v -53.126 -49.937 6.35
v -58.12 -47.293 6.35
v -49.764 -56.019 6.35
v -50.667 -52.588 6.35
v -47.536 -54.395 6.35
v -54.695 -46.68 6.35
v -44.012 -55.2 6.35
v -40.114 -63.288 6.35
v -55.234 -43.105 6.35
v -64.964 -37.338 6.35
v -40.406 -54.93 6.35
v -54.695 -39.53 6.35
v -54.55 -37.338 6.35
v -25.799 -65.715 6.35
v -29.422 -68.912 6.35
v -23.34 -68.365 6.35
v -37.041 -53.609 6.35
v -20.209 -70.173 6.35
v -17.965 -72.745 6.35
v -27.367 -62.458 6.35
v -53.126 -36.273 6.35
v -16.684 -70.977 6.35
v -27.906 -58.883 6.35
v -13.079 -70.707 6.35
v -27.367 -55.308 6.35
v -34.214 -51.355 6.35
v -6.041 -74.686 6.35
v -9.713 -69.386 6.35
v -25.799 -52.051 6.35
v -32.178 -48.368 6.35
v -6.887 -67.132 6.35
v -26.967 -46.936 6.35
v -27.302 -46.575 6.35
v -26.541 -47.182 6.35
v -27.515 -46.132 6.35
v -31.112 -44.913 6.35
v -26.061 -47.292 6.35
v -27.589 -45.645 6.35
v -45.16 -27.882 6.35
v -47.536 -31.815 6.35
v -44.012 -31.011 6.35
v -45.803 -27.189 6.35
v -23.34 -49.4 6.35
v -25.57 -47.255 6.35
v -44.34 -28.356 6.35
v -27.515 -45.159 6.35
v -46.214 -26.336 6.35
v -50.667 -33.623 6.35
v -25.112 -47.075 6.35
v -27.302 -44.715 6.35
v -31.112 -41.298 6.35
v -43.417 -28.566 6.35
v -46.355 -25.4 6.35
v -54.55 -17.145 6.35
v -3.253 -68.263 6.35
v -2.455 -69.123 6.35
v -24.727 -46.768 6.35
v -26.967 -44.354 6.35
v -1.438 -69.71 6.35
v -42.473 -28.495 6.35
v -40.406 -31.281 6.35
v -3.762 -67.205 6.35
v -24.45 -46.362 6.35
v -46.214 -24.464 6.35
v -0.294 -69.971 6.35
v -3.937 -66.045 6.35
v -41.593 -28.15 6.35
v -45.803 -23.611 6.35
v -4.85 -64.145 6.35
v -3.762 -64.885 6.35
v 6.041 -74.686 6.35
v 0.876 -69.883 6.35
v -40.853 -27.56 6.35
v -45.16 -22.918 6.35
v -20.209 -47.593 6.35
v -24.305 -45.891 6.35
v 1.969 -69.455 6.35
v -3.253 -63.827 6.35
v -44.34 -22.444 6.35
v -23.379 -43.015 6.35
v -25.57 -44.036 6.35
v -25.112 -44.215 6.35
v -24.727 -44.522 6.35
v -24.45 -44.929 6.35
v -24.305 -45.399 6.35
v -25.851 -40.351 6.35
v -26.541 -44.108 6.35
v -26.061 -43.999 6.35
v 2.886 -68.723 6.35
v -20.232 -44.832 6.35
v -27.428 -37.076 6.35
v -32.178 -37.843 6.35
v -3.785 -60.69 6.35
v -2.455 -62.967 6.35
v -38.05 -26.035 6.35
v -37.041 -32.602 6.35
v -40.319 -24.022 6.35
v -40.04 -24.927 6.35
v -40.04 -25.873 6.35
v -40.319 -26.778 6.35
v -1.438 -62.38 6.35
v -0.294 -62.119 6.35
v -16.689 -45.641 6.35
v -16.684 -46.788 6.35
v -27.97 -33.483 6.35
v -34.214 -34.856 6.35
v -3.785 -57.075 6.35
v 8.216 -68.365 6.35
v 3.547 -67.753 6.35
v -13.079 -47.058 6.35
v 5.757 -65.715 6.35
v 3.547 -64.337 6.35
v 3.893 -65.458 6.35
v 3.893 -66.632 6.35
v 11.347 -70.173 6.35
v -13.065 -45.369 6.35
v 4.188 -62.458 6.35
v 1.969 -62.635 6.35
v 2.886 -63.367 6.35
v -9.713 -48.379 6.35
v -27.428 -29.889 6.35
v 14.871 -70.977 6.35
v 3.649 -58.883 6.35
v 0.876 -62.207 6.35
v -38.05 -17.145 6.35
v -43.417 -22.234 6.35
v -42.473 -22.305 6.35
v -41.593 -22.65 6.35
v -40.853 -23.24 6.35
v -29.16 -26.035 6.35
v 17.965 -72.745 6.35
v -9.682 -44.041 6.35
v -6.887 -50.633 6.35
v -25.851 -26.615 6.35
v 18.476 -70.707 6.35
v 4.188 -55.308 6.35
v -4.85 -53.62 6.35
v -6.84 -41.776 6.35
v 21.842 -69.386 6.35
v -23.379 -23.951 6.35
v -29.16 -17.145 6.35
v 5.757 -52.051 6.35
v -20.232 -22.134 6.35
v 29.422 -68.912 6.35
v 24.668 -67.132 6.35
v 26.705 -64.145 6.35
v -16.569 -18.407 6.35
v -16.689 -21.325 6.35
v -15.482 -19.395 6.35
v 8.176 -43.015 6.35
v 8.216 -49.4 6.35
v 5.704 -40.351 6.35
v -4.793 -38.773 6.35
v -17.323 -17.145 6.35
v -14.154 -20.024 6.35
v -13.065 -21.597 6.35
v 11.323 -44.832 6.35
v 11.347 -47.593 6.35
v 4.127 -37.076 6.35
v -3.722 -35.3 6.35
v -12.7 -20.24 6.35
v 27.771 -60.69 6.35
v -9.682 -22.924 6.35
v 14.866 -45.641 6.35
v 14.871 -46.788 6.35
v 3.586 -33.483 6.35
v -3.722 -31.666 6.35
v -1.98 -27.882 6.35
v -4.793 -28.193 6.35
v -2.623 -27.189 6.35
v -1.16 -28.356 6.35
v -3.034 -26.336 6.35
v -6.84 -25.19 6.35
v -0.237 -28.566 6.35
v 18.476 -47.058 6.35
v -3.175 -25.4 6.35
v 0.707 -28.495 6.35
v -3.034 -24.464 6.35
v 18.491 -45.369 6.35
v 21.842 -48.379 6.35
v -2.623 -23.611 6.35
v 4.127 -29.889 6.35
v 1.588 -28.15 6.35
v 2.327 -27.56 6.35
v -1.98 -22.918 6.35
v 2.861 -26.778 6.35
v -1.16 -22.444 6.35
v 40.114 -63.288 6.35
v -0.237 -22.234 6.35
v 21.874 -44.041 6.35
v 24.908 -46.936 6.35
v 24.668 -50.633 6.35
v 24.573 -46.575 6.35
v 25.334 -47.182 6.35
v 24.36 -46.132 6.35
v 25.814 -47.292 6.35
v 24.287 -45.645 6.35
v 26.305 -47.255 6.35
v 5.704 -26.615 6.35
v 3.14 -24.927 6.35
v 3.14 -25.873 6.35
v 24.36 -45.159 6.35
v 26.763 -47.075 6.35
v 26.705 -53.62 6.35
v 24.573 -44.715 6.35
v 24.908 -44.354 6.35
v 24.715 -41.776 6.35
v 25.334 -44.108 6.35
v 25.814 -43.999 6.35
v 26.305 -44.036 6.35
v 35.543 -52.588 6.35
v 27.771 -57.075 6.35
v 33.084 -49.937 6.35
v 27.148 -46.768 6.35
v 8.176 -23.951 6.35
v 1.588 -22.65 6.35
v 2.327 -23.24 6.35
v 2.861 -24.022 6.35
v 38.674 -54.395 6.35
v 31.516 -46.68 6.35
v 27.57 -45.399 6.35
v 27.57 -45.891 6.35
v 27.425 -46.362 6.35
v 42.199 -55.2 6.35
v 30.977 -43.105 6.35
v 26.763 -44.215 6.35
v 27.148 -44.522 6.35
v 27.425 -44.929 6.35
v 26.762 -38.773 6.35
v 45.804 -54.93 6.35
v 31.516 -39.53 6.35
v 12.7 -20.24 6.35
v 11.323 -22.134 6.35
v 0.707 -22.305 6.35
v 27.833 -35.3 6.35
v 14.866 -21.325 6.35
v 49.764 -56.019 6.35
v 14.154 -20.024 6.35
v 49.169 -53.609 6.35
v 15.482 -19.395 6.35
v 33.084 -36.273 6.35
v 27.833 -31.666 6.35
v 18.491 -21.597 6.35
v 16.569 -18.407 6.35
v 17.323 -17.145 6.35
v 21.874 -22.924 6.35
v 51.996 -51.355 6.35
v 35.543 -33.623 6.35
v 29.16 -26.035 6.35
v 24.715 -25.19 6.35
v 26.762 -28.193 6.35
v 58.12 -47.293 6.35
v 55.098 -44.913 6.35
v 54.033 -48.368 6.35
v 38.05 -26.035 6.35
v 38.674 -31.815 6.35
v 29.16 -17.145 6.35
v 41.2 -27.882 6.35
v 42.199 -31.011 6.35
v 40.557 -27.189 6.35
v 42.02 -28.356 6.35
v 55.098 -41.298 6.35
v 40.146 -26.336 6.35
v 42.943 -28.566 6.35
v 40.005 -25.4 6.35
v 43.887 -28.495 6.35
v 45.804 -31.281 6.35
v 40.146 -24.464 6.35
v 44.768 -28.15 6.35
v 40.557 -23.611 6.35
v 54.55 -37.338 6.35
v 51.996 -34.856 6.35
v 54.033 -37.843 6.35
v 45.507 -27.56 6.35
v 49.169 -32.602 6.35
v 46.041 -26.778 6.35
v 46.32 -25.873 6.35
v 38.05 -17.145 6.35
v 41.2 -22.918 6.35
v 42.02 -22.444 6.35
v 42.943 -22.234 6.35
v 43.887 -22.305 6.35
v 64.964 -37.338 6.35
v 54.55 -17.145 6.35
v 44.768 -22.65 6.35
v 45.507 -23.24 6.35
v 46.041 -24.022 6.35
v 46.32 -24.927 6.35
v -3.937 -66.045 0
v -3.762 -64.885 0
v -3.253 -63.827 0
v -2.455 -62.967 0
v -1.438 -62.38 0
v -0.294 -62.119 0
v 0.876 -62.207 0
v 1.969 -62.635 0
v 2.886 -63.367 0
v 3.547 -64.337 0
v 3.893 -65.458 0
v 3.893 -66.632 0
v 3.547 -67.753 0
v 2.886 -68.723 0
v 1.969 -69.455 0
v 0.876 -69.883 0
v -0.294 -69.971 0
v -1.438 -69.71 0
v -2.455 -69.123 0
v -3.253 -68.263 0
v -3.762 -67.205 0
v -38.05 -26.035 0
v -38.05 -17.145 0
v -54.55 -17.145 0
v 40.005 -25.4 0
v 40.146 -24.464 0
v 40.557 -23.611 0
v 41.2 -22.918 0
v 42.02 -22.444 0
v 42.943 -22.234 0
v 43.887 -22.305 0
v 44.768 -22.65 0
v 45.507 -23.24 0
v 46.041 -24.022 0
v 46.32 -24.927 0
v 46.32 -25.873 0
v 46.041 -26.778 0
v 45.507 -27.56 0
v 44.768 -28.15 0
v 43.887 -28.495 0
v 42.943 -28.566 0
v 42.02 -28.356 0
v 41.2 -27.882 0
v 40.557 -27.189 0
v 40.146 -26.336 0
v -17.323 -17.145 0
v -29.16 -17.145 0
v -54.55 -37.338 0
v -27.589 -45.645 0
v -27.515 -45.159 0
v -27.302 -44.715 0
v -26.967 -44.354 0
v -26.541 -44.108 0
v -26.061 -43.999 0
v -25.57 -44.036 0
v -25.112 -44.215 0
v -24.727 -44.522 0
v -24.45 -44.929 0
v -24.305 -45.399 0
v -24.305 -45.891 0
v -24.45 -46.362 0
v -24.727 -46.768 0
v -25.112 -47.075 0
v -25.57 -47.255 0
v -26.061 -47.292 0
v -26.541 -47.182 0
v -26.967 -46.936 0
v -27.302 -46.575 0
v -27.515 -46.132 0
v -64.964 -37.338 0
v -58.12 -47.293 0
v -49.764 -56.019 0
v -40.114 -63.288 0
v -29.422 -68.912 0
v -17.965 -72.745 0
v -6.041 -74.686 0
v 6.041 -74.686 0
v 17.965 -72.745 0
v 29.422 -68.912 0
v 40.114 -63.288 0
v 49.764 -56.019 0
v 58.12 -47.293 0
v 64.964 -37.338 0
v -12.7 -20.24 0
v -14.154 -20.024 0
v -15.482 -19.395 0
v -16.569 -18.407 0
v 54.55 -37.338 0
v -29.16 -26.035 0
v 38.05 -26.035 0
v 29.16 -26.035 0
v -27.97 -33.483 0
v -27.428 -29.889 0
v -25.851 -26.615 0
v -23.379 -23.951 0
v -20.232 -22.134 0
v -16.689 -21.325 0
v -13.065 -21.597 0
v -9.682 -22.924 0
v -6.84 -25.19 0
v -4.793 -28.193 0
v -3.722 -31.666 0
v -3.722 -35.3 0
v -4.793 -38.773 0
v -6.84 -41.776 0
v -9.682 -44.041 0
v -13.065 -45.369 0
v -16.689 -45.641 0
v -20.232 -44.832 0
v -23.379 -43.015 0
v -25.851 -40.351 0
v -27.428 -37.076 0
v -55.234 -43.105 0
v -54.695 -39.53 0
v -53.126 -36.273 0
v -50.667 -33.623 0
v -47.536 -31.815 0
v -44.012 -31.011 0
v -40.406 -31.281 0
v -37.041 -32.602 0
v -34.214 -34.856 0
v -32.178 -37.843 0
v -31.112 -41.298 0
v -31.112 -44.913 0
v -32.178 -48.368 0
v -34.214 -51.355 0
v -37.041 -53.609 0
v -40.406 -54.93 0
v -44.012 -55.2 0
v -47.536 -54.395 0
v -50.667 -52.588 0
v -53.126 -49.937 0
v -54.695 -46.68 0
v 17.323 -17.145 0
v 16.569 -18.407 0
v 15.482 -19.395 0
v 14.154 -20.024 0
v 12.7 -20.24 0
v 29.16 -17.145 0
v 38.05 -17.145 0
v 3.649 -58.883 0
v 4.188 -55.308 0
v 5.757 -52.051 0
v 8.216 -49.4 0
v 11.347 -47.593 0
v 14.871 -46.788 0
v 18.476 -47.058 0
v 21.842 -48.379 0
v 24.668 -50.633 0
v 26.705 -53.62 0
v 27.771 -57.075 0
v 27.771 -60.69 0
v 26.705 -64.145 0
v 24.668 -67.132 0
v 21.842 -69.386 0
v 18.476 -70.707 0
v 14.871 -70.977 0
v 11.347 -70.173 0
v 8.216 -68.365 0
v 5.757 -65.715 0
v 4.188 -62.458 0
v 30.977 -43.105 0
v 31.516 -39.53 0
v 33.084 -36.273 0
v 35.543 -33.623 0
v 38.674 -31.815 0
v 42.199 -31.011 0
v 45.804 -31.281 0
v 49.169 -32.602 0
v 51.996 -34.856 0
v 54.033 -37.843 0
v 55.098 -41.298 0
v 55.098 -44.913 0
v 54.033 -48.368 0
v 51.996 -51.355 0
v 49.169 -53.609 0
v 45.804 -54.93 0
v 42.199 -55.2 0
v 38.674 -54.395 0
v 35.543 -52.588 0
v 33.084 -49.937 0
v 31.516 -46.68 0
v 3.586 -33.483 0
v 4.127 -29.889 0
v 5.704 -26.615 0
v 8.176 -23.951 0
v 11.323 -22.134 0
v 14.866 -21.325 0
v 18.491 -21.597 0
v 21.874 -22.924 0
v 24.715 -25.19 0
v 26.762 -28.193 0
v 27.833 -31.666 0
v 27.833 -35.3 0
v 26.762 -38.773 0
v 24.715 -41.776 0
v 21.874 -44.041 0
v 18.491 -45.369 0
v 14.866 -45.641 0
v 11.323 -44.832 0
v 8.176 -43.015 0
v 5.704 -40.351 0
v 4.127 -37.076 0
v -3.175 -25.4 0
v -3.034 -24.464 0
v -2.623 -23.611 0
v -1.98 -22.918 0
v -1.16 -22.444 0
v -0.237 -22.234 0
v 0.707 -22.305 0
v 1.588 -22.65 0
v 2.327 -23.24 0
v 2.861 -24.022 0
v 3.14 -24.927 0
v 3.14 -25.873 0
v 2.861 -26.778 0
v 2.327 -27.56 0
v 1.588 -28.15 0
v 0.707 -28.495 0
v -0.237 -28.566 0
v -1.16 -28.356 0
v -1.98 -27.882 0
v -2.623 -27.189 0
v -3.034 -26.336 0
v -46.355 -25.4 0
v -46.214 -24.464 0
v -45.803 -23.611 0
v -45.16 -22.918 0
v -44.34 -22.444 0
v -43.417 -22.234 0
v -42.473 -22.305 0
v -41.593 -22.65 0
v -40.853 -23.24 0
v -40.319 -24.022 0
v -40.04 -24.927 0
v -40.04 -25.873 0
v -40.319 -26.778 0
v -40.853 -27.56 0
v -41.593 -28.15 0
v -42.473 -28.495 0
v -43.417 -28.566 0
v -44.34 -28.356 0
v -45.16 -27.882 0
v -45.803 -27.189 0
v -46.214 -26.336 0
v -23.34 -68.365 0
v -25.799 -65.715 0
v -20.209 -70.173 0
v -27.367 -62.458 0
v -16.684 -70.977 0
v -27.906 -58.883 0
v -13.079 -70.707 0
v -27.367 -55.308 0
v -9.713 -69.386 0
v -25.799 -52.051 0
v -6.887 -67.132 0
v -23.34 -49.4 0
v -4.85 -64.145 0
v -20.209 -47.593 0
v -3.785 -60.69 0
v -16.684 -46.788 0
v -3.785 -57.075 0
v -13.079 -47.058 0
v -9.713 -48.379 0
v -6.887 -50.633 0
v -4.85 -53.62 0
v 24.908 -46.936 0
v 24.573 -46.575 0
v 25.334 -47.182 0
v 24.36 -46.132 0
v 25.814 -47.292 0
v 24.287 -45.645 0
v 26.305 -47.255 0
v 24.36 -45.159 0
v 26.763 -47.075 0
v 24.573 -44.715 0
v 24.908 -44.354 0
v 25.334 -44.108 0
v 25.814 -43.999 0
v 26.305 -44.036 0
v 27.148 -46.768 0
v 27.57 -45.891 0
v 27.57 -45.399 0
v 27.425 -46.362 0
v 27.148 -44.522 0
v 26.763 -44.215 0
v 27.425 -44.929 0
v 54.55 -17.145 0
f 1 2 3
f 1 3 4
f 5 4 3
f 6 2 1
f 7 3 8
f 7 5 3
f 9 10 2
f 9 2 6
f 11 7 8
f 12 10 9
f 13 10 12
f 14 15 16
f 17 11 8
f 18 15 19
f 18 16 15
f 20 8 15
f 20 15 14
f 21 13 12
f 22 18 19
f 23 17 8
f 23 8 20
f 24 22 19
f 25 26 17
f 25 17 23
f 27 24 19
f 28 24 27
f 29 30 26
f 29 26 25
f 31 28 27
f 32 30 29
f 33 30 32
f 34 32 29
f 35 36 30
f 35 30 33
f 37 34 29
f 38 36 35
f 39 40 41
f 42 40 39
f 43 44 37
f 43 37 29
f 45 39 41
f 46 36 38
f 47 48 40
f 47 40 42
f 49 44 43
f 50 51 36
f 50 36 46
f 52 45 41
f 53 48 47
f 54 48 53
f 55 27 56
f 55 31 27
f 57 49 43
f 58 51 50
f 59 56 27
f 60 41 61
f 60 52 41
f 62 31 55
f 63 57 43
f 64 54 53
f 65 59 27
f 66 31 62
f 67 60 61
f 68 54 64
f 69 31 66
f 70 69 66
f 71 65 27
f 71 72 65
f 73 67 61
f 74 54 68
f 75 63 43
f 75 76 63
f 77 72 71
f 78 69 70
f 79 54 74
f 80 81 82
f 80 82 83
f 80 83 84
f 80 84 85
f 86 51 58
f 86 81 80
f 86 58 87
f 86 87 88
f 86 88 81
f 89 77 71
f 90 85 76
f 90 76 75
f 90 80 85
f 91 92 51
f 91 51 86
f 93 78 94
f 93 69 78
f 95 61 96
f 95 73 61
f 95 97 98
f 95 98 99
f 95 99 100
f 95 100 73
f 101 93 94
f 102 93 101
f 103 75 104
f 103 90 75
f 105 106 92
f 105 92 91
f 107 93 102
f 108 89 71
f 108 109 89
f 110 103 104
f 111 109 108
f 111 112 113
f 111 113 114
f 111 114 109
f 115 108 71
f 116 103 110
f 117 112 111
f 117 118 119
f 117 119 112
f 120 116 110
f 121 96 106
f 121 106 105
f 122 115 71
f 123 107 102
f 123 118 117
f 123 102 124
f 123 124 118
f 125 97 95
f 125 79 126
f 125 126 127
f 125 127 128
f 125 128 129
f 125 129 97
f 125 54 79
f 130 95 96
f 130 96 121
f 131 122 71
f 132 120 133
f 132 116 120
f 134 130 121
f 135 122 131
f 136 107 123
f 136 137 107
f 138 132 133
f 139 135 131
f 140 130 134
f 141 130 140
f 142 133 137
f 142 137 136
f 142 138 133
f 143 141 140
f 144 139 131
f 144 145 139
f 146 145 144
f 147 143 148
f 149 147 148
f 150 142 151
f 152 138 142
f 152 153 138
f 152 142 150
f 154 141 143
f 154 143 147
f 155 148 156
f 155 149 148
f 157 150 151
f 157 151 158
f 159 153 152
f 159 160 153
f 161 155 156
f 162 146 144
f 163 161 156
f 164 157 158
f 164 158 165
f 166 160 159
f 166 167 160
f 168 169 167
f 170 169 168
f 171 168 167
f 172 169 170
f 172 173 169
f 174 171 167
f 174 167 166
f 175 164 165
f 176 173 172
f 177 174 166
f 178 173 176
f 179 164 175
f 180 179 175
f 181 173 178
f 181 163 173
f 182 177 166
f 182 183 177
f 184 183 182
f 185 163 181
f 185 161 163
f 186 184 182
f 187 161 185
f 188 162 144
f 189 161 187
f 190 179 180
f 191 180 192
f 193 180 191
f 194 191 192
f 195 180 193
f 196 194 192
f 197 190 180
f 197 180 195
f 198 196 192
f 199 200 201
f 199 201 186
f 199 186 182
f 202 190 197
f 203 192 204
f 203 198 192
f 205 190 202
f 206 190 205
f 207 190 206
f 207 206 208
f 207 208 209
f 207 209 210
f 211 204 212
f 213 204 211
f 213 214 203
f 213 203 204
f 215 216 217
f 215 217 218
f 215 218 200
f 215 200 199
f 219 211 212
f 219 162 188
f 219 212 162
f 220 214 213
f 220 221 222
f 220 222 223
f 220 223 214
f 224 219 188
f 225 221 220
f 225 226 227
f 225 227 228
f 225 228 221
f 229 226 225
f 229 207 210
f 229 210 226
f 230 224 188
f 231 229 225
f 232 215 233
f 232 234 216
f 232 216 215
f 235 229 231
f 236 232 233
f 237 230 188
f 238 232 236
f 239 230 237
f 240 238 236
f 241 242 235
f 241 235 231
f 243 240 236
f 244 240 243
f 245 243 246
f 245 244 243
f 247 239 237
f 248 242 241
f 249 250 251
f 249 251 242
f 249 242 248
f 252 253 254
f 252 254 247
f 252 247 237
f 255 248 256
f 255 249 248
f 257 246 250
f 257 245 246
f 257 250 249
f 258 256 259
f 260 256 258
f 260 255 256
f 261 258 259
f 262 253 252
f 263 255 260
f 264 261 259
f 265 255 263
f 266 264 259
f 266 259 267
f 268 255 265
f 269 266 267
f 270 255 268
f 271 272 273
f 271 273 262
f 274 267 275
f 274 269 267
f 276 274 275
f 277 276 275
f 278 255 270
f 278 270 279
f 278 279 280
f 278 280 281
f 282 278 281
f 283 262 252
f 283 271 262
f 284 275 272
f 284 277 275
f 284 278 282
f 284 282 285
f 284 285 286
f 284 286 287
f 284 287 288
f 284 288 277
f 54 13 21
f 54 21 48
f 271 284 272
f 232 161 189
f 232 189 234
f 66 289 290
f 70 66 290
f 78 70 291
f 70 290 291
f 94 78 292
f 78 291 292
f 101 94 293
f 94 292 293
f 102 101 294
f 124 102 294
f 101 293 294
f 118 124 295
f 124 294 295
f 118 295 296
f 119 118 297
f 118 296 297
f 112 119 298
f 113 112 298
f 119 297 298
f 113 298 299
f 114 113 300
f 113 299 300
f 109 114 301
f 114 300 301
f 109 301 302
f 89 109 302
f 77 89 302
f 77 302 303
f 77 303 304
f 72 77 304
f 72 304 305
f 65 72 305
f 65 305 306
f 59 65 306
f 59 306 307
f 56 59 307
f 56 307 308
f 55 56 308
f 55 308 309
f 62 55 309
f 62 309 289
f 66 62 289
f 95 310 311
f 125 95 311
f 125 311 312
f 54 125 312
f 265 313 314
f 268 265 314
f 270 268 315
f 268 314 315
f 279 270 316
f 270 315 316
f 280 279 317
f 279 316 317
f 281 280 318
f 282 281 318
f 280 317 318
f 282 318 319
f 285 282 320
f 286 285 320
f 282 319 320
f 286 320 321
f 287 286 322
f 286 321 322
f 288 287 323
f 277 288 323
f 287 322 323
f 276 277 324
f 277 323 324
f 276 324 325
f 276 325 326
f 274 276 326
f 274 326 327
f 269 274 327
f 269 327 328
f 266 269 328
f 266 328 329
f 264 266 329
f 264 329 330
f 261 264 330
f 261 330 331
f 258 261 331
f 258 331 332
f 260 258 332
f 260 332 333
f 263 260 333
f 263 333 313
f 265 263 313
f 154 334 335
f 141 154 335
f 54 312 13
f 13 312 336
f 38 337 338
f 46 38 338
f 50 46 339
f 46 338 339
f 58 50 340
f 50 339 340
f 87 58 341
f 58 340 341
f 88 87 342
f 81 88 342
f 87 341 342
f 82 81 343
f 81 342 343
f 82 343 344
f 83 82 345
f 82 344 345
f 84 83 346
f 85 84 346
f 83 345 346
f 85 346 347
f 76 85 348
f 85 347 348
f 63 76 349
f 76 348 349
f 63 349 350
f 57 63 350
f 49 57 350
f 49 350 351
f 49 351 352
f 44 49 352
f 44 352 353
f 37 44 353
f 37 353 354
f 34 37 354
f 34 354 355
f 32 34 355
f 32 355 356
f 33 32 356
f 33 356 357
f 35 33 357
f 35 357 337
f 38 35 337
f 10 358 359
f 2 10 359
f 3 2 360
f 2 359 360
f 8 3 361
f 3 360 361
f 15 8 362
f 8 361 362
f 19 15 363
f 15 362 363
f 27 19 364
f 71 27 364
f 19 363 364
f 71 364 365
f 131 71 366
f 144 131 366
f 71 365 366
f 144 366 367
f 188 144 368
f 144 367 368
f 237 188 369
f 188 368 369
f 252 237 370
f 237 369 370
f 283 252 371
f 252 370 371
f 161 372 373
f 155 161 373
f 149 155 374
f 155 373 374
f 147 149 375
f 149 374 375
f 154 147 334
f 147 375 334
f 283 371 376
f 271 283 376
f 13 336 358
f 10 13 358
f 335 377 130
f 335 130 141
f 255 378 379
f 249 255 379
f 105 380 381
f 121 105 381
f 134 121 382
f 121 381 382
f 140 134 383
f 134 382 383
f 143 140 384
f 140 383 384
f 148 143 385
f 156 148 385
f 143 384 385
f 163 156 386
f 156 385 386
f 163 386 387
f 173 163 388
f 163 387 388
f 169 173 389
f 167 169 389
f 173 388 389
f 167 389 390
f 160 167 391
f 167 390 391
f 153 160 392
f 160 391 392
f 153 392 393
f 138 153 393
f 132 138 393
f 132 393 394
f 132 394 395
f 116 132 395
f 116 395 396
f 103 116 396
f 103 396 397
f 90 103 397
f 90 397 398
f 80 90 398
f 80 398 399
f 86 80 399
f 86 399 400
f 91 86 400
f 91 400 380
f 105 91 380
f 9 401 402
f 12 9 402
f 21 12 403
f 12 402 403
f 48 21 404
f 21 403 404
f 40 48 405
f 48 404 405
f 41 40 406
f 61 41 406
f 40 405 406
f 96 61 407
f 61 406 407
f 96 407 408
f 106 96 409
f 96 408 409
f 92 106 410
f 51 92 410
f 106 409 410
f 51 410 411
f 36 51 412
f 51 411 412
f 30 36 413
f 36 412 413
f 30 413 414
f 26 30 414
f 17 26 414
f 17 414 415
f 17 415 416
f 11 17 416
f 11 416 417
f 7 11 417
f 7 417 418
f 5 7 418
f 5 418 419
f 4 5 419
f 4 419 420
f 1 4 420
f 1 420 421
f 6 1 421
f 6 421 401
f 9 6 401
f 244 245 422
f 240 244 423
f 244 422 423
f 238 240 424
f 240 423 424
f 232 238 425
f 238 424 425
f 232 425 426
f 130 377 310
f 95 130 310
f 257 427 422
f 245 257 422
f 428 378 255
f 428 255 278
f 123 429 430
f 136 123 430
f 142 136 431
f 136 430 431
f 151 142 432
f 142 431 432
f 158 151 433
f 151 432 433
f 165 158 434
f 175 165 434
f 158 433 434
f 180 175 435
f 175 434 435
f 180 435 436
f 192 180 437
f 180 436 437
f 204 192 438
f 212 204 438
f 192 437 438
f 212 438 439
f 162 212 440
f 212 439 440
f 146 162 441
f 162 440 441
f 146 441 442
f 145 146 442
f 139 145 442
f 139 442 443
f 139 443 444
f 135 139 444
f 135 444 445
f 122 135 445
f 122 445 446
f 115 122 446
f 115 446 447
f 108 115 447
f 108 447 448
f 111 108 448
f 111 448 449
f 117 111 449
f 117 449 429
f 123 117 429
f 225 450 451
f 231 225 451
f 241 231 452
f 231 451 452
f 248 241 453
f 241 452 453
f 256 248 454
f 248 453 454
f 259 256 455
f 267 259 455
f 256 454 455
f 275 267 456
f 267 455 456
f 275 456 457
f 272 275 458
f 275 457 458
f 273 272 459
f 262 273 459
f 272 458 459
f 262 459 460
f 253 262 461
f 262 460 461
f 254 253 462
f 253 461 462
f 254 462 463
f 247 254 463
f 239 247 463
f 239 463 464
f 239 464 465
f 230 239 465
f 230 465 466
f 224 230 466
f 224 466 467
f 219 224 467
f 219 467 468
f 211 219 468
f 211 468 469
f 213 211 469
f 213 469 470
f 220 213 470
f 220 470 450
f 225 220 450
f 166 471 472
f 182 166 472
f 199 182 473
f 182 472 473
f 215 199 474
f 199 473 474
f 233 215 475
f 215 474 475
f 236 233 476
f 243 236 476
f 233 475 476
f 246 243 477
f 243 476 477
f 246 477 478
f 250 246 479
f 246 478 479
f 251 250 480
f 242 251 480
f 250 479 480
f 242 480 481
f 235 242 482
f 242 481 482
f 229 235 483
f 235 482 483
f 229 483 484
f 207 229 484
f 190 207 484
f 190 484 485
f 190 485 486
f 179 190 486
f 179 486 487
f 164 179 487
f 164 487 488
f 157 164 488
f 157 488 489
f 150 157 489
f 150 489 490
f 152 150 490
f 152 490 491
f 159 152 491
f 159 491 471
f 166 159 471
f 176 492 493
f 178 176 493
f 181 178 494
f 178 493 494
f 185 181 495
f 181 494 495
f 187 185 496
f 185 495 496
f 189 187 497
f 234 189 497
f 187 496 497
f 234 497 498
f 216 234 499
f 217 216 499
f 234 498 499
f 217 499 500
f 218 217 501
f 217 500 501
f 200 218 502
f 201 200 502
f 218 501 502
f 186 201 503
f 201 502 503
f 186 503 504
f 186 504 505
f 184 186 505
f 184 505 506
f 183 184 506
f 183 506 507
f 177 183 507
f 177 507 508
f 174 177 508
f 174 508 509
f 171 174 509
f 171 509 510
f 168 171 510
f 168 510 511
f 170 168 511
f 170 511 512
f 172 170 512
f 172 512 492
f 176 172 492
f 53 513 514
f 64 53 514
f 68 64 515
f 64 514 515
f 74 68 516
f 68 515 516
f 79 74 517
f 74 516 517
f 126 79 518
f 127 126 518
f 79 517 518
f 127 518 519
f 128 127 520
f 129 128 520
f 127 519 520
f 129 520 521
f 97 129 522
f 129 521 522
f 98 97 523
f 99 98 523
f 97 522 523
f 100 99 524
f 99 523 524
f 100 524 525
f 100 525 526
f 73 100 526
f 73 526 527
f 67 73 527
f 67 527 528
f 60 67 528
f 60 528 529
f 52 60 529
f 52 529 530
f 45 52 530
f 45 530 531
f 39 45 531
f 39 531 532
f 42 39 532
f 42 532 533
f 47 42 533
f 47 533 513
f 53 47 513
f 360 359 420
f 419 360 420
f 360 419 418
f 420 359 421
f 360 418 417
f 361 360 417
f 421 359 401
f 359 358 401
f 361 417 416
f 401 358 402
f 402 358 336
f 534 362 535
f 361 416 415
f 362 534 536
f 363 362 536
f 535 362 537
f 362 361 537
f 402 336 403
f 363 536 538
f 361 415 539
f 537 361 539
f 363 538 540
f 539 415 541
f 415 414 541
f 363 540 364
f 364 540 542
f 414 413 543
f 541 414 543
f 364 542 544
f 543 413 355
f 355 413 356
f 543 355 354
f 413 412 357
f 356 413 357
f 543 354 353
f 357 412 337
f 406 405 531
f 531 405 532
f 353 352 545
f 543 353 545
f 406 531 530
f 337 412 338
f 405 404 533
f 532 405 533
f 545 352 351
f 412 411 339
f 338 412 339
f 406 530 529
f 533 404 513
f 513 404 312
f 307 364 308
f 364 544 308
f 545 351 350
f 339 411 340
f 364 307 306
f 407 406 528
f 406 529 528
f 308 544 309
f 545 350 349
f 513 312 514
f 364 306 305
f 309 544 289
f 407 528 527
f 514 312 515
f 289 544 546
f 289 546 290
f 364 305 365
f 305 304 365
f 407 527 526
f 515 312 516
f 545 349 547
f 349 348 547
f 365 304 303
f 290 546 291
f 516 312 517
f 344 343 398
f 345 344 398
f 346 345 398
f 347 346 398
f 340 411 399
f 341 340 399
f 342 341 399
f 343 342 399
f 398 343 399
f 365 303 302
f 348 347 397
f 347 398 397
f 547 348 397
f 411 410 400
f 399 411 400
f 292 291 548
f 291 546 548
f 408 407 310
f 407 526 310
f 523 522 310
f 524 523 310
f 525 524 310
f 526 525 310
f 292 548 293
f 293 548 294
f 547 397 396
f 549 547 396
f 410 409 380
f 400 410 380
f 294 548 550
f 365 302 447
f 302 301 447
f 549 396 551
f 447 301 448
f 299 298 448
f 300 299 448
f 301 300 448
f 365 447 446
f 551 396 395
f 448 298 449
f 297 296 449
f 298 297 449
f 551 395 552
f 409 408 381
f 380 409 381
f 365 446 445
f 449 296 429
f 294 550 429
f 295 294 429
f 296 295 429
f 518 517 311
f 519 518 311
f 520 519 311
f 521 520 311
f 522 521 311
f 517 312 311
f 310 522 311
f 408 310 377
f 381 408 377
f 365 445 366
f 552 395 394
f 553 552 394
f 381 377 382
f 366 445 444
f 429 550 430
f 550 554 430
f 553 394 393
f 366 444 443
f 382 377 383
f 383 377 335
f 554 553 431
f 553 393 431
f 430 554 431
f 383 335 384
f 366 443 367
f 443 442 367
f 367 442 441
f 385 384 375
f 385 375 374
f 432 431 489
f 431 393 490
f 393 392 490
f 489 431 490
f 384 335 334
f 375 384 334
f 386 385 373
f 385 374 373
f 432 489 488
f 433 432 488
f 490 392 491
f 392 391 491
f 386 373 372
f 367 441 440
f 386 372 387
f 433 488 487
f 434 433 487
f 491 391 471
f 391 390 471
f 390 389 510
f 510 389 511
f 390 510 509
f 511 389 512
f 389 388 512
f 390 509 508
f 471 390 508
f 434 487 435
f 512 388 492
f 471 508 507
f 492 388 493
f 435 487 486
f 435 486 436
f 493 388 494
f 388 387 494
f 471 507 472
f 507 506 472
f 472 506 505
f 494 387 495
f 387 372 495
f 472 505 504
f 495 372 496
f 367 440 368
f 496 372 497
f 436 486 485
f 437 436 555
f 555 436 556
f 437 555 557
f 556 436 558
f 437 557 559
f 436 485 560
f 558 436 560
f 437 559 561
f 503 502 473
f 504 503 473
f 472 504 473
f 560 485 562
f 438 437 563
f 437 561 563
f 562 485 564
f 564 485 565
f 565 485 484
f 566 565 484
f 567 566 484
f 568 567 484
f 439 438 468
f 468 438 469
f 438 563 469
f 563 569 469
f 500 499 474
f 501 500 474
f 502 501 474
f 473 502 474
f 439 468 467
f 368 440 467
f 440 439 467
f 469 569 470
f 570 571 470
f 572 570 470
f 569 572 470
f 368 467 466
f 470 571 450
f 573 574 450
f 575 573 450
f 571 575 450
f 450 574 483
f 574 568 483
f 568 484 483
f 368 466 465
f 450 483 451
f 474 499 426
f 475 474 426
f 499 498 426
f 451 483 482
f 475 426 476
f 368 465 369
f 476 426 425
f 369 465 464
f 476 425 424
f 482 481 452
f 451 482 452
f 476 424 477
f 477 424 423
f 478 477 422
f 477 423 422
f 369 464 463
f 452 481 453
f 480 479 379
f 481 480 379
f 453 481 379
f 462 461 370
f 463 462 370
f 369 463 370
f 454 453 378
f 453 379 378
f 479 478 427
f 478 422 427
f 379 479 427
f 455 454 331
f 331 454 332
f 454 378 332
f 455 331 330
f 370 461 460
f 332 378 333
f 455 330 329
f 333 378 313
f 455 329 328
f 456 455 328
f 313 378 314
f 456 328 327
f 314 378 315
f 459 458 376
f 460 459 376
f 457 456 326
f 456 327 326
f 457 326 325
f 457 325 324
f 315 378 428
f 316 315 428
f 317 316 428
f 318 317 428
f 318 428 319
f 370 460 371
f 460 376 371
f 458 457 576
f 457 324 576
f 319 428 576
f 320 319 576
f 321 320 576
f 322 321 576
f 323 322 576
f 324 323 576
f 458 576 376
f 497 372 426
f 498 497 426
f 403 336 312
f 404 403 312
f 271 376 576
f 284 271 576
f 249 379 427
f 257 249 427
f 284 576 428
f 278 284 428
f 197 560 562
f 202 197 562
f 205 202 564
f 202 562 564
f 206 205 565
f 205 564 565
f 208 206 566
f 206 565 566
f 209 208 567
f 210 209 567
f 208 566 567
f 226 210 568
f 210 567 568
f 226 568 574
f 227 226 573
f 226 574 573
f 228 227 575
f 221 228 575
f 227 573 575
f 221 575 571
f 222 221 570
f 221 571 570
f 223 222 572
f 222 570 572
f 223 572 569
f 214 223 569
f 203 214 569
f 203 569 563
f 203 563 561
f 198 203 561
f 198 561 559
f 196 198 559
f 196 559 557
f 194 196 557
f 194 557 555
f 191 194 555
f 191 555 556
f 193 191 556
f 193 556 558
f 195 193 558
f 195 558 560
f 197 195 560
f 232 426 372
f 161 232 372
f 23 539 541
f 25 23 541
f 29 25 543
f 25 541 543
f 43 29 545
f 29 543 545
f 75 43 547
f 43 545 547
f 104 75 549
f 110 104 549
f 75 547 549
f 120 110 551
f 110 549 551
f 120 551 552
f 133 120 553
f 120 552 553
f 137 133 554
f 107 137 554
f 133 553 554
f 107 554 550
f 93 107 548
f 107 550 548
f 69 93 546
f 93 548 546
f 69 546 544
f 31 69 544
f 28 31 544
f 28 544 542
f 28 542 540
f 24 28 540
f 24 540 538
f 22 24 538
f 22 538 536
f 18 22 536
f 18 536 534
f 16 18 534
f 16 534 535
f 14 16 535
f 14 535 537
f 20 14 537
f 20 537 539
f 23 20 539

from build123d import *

# Parameters (mm, degrees)
SKETCH1_R           = 1.651
BOSS_EXTRUDE2_DEPTH = 6.35
SKETCH2_R           = 1.143
CUT_EXTRUDE1_DEPTH  = 7.35
SKETCH3_R           = 12.1285
CUT_EXTRUDE2_DEPTH  = 7.35
SKETCH4_W           = 28.562713242
SKETCH4_H           = 11.677503754
BOSS_EXTRUDE3_DEPTH = 6.35
SKETCH5_W           = 216.7214489
SKETCH5_H           = 130.569220634
CUT_EXTRUDE4_DEPTH  = 7.35
SKETCH11_R          = 3.937
CUT_EXTRUDE11_DEPTH = 7.35
SKETCH12_W          = 8.89
SKETCH12_H          = 8.89
CUT_EXTRUDE12_DEPTH = 7.35
SKETCH14_R          = 3.175
CUT_EXTRUDE14_DEPTH = 45.45
CUT_EXTRUDE15_DEPTH = 21.59
SKETCH16_R          = 12.192
CUT_EXTRUDE16_DEPTH = 21.59
SKETCH57_R          = 1.651
CUT_EXTRUDE57_DEPTH = 58.674


with BuildPart() as part:
    # Sketch1 → Boss-Extrude2 (new body)
    with BuildSketch(Plane.XY):
        with BuildLine():
            Line((-64.964441474, 37.338), (-54.550441474, 37.338))
            Line((-54.550441474, 37.338), (-54.550441474, -37.338))
            Line((-54.550441474, -37.338), (-64.964441474, -37.338))
            ThreePointArc((-64.964441474, -37.338), (0, -74.93), (64.964441474, -37.338))
            Line((64.964441474, -37.338), (54.550441474, -37.338))
            Line((54.550441474, -37.338), (54.550441474, 37.338))
            Line((54.550441474, 37.338), (64.964441474, 37.338))
            ThreePointArc((64.964441474, 37.338), (0, 74.93), (-64.964441474, 37.338))
        make_face()
        with Locations((-46.482, 11.049)):
            Circle(SKETCH1_R, mode=Mode.SUBTRACT)
        with Locations((-21.083270032, 10.795)):
            Circle(SKETCH1_R, mode=Mode.SUBTRACT)
        with Locations((-21.083270032, -10.795)):
            Circle(SKETCH1_R, mode=Mode.SUBTRACT)
        with Locations((-46.482, -11.049)):
            Circle(SKETCH1_R, mode=Mode.SUBTRACT)
        with Locations((46.482, -11.049)):
            Circle(SKETCH1_R, mode=Mode.SUBTRACT)
        with Locations((21.083270032, -10.795)):
            Circle(SKETCH1_R, mode=Mode.SUBTRACT)
        with Locations((21.083270032, 10.795)):
            Circle(SKETCH1_R, mode=Mode.SUBTRACT)
        with Locations((46.482, 11.049)):
            Circle(SKETCH1_R, mode=Mode.SUBTRACT)
    extrude(amount=BOSS_EXTRUDE2_DEPTH)

    # Sketch2 → Cut-Extrude1 (cut, through all)
    with BuildSketch(Plane.XY.offset(6.35)):
        with Locations((-6.731, 62.23)):
            Circle(SKETCH2_R)
        with Locations((6.731, 62.23)):
            Circle(SKETCH2_R)
    extrude(amount=-CUT_EXTRUDE1_DEPTH, mode=Mode.SUBTRACT)

    # Sketch3 → Cut-Extrude2 (cut, through all)
    with BuildSketch(Plane(origin=(0, 0, 0), x_dir=(-1, 0, 0), z_dir=(0, 0, -1))):
        with Locations((-15.777608989, -58.882838371)):
            Circle(SKETCH3_R)
        with Locations((15.777608989, -58.882838371)):
            Circle(SKETCH3_R)
        with Locations((-43.105229381, -43.105229381)):
            Circle(SKETCH3_R)
        with Locations((-43.105229381, 43.105229381)):
            Circle(SKETCH3_R)
        with Locations((43.105229381, 43.105229381)):
            Circle(SKETCH3_R)
        with Locations((43.105229381, -43.105229381)):
            Circle(SKETCH3_R)
    extrude(amount=-CUT_EXTRUDE2_DEPTH, mode=Mode.SUBTRACT)

    # Sketch4 → Boss-Extrude3 (add)
    with BuildSketch(Plane(origin=(0, 0, 0), x_dir=(-1, 0, 0), z_dir=(0, 0, -1))):
        with Locations((-1.488809975, 62.152540216)):
            Rectangle(SKETCH4_W, SKETCH4_H)
    extrude(amount=-BOSS_EXTRUDE3_DEPTH)

    # Sketch5 → Cut-Extrude4 (cut, through all)
    with BuildSketch(Plane(origin=(0, 0, 0), x_dir=(-1, 0, 0), z_dir=(0, 0, -1))):
        with Locations((23.316688373, 48.139610317)):
            Rectangle(SKETCH5_W, SKETCH5_H)
    extrude(amount=-CUT_EXTRUDE4_DEPTH, mode=Mode.SUBTRACT)

    # Sketch11 → Cut-Extrude11 (cut, through all)
    with BuildSketch(Plane(origin=(0, 0, 0), x_dir=(-1, 0, 0), z_dir=(0, 0, -1))):
        with Locations((0, -66.045)):
            Circle(SKETCH11_R)
    extrude(amount=-CUT_EXTRUDE11_DEPTH, mode=Mode.SUBTRACT)

    # Sketch12 → Cut-Extrude12 (cut, through all)
    with BuildSketch(Plane(origin=(0, 0, 0), x_dir=(-1, 0, 0), z_dir=(0, 0, -1))):
        with Locations((-33.605441474, -21.59)):
            Rectangle(SKETCH12_W, SKETCH12_H)
        with Locations((33.605441474, -21.59)):
            Rectangle(SKETCH12_W, SKETCH12_H)
    extrude(amount=-CUT_EXTRUDE12_DEPTH, mode=Mode.SUBTRACT)

    # Sketch14 → Cut-Extrude14 (cut, through all)
    with BuildSketch(Plane(origin=(30.092005081, 4.08352975, -38.1), x_dir=(-1, 0, 0), z_dir=(0, 0, -1))):
        with Locations((73.272005081, -29.48352975)):
            Circle(SKETCH14_R)
        with Locations((30.092005081, -29.48352975)):
            Circle(SKETCH14_R)
        with Locations((-13.087994919, -29.48352975)):
            Circle(SKETCH14_R)
    extrude(amount=-CUT_EXTRUDE14_DEPTH, mode=Mode.SUBTRACT)

    # Sketch15 → Cut-Extrude15 (cut)
    with BuildSketch(Plane(origin=(0, 0, 0), x_dir=(-1, 0, 0), z_dir=(0, 0, -1))):
        with BuildLine():
            Line((-12.7, -20.24), (-6.06, -20.24))
            Line((-6.06, -20.24), (12.7, -20.24))
            ThreePointArc((12.7, -20.24), (16.235533906, -11.704466094), (7.7, -15.24))
            Line((7.7, -15.24), (-1.06, -15.24))
            ThreePointArc((-1.06, -15.24), (-4.010609847, -10.6792983), (-9.38, -11.501337137))
            ThreePointArc((-9.38, -11.501337137), (-17.374040774, -13.464234575), (-12.7, -20.24))
        make_face()
    extrude(amount=-CUT_EXTRUDE15_DEPTH, mode=Mode.SUBTRACT)

    # Sketch16 → Cut-Extrude16 (cut)
    with BuildSketch(Plane(origin=(0, 0, 0), x_dir=(-1, 0, 0), z_dir=(0, 0, -1))):
        with Locations((15.777608989, -33.482838371)):
            Circle(SKETCH16_R)
        with Locations((-15.777608989, -33.482838371)):
            Circle(SKETCH16_R)
    extrude(amount=-CUT_EXTRUDE16_DEPTH, mode=Mode.SUBTRACT)

    # Sketch57 → Cut-Extrude57 (cut)
    with BuildSketch(Plane(origin=(0, 0, 0), x_dir=(-1, 0, 0), z_dir=(0, 0, -1))):
        with Locations((-25.937608989, -45.645229381)):
            Circle(SKETCH57_R)
        with Locations((25.937608989, -45.645229381)):
            Circle(SKETCH57_R)
    extrude(amount=-CUT_EXTRUDE57_DEPTH, mode=Mode.SUBTRACT)


solid = part.part
